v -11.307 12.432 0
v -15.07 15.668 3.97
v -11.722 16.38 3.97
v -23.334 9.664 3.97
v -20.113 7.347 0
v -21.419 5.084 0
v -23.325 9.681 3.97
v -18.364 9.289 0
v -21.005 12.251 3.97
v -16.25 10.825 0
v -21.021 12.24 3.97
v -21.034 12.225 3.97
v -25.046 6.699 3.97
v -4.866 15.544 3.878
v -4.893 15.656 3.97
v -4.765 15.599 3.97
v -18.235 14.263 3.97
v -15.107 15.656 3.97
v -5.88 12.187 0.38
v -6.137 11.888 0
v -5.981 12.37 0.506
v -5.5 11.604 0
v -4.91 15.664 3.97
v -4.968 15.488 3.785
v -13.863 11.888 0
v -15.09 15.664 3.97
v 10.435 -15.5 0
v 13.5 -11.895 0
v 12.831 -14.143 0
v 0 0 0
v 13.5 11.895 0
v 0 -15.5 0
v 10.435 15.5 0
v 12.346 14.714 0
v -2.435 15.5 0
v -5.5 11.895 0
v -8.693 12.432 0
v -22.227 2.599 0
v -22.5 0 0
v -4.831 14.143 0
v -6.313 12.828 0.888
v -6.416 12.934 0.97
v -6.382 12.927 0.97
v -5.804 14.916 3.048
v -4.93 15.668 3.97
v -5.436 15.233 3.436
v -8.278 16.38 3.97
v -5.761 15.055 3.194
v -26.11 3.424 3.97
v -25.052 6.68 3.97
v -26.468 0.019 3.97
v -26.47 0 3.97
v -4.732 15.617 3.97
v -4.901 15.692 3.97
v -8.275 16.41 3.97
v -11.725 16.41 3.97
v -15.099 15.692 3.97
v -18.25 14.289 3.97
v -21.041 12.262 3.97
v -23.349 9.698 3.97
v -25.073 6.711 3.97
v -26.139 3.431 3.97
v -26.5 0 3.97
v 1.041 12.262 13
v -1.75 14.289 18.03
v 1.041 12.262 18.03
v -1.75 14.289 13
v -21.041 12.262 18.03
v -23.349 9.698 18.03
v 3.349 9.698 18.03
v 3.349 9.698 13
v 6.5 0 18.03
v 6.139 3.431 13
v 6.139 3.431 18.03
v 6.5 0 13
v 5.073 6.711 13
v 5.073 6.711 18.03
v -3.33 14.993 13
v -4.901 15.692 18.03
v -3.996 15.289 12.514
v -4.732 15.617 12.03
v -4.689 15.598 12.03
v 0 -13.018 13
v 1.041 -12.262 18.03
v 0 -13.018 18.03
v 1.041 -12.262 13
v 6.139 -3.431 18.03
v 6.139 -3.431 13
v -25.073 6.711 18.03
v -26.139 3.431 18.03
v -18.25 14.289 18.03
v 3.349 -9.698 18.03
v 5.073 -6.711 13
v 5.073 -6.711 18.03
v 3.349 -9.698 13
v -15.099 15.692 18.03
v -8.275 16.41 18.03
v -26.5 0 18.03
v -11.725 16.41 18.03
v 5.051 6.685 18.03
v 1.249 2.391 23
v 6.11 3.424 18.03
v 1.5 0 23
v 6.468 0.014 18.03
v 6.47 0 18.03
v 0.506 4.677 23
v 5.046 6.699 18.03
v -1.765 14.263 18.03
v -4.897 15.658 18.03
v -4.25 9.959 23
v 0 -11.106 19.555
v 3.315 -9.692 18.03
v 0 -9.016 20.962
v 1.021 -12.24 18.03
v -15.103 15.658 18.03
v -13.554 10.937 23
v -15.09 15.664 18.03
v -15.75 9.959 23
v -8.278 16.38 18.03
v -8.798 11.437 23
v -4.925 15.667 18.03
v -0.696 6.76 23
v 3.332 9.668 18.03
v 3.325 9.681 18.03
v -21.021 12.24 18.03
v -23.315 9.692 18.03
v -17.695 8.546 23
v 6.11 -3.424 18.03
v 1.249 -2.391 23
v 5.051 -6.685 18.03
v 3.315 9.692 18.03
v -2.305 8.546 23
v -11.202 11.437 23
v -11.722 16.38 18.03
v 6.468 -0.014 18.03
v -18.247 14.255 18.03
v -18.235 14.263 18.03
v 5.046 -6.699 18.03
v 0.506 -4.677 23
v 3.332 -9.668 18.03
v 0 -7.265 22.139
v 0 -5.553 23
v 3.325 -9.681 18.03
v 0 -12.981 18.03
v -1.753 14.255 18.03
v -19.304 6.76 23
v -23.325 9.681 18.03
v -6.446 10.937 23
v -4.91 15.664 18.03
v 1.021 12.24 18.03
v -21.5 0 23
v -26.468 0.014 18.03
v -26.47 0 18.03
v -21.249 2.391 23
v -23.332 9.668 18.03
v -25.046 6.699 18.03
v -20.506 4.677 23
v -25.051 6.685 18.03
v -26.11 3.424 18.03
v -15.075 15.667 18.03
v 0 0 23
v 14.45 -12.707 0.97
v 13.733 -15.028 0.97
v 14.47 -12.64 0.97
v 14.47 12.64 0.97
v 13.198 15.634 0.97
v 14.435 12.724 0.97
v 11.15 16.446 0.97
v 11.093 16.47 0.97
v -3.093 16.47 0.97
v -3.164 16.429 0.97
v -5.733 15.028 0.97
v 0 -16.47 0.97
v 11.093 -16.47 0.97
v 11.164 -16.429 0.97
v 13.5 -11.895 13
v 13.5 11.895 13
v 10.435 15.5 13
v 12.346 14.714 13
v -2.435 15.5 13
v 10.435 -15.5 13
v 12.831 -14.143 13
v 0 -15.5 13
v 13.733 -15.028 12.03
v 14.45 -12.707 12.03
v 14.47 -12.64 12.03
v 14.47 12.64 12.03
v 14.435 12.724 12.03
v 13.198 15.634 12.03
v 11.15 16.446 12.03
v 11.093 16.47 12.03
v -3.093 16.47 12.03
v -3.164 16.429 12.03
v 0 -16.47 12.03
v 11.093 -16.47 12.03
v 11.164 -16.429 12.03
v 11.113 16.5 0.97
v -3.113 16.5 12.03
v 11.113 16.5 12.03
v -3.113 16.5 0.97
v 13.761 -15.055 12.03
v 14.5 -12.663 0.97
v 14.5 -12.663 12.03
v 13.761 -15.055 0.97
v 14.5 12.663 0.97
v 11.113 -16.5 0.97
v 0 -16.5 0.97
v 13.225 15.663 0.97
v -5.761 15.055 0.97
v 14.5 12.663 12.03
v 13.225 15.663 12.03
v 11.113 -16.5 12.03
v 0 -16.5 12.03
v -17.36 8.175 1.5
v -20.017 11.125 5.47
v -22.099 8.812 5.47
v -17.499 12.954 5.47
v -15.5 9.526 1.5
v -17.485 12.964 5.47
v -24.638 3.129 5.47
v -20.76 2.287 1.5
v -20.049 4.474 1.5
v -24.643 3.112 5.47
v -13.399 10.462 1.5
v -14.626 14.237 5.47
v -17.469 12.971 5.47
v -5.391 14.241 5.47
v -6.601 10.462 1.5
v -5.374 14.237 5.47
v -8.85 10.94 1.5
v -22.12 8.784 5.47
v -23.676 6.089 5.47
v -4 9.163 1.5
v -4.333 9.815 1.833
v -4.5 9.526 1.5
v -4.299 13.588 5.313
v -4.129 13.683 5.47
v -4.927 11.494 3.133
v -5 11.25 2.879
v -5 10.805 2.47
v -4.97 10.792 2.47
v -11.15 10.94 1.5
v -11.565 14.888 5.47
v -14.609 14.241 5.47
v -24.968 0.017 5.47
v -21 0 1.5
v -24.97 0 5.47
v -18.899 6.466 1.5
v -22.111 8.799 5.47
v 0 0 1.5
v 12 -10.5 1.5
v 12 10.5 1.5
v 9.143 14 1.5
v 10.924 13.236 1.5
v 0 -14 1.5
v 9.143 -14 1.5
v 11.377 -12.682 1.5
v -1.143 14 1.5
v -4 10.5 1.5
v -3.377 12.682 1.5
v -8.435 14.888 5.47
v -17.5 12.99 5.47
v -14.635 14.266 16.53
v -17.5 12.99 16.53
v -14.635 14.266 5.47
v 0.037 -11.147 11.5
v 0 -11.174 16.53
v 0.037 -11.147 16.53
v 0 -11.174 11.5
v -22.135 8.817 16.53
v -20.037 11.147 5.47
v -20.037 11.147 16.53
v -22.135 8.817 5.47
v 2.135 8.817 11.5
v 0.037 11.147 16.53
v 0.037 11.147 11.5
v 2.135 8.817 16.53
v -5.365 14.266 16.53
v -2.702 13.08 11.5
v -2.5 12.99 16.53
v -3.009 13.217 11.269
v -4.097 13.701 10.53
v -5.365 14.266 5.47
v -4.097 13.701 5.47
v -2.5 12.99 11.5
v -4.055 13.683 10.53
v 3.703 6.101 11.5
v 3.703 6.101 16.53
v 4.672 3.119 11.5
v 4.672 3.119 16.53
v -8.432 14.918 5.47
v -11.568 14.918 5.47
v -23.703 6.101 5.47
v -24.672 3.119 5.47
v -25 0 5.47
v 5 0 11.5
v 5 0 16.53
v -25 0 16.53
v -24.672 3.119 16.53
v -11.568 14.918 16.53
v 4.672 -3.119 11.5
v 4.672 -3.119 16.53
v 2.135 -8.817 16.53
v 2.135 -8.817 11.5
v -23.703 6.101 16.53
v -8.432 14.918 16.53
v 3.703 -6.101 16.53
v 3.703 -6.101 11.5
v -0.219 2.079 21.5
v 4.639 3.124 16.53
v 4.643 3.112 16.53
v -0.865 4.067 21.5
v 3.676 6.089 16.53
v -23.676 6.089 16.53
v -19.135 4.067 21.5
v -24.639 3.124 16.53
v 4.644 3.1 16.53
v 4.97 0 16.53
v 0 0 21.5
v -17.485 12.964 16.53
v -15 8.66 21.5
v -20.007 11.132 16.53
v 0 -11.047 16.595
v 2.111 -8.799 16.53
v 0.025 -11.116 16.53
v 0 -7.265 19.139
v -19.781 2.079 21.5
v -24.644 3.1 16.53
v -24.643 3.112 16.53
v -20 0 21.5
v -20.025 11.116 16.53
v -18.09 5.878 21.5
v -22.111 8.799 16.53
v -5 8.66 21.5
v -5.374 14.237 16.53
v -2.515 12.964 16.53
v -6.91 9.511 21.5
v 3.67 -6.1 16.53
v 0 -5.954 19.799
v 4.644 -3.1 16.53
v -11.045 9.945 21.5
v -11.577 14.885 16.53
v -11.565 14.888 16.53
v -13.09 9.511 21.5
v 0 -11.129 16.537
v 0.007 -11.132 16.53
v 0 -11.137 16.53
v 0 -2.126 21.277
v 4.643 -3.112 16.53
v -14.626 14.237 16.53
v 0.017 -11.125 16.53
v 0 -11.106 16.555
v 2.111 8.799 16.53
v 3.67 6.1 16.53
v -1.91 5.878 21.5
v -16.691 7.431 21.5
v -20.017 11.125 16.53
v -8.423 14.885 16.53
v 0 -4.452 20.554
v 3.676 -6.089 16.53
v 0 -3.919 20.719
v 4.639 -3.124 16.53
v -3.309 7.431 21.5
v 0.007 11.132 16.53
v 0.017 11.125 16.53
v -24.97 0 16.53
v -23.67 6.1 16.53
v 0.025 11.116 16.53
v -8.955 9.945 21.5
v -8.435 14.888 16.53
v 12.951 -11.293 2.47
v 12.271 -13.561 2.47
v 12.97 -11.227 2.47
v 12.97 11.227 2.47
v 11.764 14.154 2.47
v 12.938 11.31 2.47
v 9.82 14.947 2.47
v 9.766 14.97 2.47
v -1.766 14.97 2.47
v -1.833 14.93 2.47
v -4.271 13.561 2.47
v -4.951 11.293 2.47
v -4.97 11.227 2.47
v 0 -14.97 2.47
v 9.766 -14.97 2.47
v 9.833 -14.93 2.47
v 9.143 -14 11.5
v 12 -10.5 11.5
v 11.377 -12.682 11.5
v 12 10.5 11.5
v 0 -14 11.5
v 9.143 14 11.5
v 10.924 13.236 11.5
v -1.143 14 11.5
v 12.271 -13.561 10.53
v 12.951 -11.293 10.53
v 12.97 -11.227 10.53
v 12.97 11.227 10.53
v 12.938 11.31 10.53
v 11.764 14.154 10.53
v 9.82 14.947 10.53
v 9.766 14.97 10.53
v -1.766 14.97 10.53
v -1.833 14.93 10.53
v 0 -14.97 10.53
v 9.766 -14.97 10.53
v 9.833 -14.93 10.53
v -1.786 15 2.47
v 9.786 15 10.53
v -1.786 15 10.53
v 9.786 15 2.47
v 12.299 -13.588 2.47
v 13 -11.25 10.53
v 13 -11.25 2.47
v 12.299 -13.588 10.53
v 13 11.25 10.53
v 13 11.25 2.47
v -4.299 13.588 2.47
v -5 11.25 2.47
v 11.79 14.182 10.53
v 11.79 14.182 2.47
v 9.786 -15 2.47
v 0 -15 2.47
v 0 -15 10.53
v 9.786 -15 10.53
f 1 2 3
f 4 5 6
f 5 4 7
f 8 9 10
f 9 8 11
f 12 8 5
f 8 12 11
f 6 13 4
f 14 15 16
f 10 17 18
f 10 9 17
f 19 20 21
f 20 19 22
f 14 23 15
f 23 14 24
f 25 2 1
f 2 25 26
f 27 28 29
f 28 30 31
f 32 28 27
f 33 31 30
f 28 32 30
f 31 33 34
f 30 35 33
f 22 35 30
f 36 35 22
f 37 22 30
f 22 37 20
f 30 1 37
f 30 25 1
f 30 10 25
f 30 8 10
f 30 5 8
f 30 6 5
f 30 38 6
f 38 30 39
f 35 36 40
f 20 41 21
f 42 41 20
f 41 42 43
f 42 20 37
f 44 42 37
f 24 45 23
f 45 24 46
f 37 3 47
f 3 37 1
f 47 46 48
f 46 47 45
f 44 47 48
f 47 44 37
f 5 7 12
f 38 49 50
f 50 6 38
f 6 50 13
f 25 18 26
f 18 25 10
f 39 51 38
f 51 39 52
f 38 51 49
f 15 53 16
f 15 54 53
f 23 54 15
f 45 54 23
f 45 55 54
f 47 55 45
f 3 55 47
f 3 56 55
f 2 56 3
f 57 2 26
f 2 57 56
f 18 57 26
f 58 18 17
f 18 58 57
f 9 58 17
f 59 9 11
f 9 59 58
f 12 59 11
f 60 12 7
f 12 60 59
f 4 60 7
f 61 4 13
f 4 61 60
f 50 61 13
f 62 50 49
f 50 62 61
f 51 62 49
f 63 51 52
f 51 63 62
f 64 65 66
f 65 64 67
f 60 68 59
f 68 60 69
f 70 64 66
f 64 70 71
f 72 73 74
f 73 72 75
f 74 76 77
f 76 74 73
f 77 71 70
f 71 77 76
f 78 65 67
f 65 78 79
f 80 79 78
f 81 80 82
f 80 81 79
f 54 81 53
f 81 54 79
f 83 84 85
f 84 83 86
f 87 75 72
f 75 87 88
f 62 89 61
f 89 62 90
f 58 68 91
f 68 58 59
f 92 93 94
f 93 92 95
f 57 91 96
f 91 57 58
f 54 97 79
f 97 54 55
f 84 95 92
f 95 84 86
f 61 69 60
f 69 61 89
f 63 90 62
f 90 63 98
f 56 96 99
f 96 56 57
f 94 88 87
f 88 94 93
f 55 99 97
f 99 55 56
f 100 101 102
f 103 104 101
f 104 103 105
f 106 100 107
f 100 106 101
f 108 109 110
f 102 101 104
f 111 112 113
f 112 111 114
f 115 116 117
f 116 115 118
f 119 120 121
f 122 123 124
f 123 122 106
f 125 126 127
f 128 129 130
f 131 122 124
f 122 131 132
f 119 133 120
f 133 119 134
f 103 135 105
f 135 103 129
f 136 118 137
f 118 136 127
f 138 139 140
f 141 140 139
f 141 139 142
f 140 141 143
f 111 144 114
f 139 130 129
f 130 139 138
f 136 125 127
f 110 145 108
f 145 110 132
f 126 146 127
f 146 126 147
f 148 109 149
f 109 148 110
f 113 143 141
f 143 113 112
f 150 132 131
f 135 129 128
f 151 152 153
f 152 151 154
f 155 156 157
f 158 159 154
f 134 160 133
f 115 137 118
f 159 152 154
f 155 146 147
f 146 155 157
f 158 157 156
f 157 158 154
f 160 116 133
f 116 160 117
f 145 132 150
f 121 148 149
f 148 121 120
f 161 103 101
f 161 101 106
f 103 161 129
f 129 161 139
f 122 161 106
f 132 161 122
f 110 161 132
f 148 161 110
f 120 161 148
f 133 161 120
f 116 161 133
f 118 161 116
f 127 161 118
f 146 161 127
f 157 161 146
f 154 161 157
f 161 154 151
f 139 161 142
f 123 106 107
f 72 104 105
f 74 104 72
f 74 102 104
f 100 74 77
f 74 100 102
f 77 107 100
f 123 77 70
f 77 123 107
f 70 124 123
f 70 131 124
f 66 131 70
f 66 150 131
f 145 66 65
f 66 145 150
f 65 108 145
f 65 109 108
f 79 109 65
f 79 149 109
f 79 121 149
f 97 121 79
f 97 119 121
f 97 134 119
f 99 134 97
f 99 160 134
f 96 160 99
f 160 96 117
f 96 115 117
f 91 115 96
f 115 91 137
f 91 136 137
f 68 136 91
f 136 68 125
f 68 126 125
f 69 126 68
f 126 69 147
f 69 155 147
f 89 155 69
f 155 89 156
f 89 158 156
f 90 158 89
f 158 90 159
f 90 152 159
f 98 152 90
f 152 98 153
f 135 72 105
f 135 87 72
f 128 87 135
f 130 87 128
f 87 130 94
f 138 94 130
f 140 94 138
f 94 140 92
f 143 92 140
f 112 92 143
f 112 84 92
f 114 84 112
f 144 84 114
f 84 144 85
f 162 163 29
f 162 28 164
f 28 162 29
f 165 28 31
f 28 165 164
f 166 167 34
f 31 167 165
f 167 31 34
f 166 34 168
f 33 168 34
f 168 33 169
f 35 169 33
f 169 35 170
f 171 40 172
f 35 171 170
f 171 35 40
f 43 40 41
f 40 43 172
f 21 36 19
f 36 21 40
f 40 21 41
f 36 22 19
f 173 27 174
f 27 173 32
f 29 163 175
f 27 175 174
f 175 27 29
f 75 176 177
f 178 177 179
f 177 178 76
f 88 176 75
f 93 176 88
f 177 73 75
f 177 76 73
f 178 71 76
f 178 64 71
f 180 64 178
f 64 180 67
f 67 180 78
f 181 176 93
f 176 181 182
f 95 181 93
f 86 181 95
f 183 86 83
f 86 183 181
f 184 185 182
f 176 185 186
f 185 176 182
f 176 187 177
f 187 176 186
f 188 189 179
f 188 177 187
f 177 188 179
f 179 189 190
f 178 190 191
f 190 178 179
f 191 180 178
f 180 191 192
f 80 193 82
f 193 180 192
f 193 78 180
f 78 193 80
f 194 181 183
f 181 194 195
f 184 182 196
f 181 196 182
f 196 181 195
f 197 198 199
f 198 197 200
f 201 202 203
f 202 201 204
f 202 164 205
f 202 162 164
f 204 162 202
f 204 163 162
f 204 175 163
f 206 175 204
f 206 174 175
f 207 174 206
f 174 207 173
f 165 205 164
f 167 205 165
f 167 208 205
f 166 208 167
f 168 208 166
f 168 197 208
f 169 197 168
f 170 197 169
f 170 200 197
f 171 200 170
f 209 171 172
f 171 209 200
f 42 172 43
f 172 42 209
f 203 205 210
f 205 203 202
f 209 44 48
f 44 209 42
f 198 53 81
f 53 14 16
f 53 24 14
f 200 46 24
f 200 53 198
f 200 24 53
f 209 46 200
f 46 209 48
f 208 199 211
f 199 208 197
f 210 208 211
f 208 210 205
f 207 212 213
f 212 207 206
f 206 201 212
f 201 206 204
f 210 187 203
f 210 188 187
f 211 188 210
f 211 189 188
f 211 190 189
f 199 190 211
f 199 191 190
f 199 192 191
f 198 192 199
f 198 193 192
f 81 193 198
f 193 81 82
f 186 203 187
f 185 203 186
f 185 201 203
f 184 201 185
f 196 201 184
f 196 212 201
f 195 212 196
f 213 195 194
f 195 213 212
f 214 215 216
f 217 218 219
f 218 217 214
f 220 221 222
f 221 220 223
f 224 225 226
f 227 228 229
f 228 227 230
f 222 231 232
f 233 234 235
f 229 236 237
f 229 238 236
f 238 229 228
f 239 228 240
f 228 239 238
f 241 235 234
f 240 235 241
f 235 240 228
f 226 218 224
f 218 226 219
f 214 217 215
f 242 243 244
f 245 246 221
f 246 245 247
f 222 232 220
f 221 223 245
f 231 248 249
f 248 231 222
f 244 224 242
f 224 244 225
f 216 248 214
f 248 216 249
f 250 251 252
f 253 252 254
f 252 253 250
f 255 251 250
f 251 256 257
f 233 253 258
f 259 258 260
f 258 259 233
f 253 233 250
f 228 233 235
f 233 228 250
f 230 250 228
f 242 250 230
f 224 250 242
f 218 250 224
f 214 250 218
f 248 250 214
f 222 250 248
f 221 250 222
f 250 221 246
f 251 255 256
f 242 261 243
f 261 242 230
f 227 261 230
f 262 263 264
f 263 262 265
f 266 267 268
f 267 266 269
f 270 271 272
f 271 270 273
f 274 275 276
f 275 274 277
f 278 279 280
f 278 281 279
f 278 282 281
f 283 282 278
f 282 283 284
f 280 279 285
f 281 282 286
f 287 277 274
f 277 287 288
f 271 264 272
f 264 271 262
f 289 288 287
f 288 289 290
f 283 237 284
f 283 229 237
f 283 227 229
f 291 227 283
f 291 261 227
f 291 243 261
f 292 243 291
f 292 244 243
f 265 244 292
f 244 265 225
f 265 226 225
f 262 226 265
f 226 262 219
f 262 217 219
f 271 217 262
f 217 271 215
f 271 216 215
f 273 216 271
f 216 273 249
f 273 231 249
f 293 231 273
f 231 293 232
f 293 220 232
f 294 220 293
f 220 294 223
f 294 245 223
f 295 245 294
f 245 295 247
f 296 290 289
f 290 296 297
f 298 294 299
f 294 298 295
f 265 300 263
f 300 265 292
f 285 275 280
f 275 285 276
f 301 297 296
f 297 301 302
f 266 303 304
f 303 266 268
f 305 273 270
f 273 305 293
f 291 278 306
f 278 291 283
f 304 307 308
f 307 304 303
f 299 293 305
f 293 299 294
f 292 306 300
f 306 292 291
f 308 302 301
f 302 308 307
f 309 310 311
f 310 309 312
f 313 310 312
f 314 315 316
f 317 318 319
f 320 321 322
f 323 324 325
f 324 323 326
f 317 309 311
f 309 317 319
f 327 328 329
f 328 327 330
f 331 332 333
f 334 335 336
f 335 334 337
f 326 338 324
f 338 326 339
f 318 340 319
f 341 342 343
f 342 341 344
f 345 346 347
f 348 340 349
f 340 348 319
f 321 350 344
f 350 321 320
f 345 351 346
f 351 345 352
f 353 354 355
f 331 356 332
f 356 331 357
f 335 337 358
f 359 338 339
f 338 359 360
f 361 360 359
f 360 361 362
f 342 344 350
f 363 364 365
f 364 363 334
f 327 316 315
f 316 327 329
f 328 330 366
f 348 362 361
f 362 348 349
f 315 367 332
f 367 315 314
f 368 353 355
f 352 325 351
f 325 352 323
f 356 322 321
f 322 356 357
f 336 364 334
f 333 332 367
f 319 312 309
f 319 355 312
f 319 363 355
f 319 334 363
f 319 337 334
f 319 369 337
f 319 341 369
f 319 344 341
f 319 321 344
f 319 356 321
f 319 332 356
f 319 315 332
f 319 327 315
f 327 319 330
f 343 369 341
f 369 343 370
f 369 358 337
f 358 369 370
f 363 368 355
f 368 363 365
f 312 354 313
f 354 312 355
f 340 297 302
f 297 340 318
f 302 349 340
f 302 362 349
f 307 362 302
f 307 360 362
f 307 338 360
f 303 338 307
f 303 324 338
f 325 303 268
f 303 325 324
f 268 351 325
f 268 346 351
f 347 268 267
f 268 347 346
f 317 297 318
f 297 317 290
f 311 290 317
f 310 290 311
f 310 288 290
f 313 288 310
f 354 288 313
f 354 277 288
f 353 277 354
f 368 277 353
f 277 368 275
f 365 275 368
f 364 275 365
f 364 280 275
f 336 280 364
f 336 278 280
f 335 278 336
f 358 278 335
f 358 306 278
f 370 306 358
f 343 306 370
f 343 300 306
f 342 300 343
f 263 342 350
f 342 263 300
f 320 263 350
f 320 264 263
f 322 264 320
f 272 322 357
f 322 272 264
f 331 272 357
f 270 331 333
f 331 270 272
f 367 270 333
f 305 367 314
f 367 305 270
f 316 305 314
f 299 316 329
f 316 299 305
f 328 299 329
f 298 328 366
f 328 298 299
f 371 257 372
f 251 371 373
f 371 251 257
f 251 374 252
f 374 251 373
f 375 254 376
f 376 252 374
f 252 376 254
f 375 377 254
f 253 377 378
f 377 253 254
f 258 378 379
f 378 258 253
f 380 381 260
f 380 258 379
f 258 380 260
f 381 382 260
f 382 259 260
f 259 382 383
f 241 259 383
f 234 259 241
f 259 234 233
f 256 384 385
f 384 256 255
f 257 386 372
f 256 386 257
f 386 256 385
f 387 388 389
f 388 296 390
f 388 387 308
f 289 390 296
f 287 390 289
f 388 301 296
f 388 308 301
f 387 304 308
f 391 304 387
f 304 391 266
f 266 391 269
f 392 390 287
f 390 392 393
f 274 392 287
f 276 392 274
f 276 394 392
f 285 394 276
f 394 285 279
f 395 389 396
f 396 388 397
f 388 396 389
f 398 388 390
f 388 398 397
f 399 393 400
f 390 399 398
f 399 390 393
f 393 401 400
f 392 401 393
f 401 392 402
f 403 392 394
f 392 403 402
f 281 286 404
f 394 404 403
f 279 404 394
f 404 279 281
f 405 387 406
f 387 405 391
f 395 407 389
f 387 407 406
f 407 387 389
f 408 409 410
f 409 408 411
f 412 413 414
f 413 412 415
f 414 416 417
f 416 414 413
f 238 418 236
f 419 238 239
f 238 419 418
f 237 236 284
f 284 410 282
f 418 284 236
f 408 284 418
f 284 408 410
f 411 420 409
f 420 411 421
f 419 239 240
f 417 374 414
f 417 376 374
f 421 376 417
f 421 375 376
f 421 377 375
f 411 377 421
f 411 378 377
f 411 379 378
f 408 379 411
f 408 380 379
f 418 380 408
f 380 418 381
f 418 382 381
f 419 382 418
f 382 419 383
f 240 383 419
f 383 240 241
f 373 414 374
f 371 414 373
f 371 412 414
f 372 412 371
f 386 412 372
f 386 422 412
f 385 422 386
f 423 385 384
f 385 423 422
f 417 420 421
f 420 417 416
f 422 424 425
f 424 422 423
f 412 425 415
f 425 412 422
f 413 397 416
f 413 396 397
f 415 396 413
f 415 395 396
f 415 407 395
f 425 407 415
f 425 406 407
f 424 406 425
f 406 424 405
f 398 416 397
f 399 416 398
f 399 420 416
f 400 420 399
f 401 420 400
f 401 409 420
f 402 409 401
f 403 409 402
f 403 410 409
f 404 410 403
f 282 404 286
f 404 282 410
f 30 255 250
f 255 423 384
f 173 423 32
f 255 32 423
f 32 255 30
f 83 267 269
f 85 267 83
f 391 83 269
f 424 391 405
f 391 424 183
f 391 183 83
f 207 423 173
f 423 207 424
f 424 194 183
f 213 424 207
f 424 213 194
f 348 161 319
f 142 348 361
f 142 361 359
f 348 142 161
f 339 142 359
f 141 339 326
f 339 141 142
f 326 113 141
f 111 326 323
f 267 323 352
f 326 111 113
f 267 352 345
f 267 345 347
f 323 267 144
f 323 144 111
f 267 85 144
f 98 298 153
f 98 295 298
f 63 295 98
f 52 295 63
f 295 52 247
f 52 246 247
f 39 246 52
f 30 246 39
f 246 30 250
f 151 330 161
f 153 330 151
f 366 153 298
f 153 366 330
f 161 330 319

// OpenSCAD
include <constructive-compiled.scad>

$skinThick=1.5; //thickness of the Skin in mm
$margin=0;


assemble()	
{
	//hull()	
															 
	addRemove(height(skin(20)), TOUP(),alignSkin(TOUP))
	{		
			
		g(X(-10),chamfer(-4,-4-1))
			 tube( d = skin(30),solid=true);

			g(X(4),chamfer(-1,-1,-5))
				box(skin(30), skin(18), h=skin(10));				
	}	
	remove(TOLEFT(TOFRONT))	box(30,h=100);		
}
